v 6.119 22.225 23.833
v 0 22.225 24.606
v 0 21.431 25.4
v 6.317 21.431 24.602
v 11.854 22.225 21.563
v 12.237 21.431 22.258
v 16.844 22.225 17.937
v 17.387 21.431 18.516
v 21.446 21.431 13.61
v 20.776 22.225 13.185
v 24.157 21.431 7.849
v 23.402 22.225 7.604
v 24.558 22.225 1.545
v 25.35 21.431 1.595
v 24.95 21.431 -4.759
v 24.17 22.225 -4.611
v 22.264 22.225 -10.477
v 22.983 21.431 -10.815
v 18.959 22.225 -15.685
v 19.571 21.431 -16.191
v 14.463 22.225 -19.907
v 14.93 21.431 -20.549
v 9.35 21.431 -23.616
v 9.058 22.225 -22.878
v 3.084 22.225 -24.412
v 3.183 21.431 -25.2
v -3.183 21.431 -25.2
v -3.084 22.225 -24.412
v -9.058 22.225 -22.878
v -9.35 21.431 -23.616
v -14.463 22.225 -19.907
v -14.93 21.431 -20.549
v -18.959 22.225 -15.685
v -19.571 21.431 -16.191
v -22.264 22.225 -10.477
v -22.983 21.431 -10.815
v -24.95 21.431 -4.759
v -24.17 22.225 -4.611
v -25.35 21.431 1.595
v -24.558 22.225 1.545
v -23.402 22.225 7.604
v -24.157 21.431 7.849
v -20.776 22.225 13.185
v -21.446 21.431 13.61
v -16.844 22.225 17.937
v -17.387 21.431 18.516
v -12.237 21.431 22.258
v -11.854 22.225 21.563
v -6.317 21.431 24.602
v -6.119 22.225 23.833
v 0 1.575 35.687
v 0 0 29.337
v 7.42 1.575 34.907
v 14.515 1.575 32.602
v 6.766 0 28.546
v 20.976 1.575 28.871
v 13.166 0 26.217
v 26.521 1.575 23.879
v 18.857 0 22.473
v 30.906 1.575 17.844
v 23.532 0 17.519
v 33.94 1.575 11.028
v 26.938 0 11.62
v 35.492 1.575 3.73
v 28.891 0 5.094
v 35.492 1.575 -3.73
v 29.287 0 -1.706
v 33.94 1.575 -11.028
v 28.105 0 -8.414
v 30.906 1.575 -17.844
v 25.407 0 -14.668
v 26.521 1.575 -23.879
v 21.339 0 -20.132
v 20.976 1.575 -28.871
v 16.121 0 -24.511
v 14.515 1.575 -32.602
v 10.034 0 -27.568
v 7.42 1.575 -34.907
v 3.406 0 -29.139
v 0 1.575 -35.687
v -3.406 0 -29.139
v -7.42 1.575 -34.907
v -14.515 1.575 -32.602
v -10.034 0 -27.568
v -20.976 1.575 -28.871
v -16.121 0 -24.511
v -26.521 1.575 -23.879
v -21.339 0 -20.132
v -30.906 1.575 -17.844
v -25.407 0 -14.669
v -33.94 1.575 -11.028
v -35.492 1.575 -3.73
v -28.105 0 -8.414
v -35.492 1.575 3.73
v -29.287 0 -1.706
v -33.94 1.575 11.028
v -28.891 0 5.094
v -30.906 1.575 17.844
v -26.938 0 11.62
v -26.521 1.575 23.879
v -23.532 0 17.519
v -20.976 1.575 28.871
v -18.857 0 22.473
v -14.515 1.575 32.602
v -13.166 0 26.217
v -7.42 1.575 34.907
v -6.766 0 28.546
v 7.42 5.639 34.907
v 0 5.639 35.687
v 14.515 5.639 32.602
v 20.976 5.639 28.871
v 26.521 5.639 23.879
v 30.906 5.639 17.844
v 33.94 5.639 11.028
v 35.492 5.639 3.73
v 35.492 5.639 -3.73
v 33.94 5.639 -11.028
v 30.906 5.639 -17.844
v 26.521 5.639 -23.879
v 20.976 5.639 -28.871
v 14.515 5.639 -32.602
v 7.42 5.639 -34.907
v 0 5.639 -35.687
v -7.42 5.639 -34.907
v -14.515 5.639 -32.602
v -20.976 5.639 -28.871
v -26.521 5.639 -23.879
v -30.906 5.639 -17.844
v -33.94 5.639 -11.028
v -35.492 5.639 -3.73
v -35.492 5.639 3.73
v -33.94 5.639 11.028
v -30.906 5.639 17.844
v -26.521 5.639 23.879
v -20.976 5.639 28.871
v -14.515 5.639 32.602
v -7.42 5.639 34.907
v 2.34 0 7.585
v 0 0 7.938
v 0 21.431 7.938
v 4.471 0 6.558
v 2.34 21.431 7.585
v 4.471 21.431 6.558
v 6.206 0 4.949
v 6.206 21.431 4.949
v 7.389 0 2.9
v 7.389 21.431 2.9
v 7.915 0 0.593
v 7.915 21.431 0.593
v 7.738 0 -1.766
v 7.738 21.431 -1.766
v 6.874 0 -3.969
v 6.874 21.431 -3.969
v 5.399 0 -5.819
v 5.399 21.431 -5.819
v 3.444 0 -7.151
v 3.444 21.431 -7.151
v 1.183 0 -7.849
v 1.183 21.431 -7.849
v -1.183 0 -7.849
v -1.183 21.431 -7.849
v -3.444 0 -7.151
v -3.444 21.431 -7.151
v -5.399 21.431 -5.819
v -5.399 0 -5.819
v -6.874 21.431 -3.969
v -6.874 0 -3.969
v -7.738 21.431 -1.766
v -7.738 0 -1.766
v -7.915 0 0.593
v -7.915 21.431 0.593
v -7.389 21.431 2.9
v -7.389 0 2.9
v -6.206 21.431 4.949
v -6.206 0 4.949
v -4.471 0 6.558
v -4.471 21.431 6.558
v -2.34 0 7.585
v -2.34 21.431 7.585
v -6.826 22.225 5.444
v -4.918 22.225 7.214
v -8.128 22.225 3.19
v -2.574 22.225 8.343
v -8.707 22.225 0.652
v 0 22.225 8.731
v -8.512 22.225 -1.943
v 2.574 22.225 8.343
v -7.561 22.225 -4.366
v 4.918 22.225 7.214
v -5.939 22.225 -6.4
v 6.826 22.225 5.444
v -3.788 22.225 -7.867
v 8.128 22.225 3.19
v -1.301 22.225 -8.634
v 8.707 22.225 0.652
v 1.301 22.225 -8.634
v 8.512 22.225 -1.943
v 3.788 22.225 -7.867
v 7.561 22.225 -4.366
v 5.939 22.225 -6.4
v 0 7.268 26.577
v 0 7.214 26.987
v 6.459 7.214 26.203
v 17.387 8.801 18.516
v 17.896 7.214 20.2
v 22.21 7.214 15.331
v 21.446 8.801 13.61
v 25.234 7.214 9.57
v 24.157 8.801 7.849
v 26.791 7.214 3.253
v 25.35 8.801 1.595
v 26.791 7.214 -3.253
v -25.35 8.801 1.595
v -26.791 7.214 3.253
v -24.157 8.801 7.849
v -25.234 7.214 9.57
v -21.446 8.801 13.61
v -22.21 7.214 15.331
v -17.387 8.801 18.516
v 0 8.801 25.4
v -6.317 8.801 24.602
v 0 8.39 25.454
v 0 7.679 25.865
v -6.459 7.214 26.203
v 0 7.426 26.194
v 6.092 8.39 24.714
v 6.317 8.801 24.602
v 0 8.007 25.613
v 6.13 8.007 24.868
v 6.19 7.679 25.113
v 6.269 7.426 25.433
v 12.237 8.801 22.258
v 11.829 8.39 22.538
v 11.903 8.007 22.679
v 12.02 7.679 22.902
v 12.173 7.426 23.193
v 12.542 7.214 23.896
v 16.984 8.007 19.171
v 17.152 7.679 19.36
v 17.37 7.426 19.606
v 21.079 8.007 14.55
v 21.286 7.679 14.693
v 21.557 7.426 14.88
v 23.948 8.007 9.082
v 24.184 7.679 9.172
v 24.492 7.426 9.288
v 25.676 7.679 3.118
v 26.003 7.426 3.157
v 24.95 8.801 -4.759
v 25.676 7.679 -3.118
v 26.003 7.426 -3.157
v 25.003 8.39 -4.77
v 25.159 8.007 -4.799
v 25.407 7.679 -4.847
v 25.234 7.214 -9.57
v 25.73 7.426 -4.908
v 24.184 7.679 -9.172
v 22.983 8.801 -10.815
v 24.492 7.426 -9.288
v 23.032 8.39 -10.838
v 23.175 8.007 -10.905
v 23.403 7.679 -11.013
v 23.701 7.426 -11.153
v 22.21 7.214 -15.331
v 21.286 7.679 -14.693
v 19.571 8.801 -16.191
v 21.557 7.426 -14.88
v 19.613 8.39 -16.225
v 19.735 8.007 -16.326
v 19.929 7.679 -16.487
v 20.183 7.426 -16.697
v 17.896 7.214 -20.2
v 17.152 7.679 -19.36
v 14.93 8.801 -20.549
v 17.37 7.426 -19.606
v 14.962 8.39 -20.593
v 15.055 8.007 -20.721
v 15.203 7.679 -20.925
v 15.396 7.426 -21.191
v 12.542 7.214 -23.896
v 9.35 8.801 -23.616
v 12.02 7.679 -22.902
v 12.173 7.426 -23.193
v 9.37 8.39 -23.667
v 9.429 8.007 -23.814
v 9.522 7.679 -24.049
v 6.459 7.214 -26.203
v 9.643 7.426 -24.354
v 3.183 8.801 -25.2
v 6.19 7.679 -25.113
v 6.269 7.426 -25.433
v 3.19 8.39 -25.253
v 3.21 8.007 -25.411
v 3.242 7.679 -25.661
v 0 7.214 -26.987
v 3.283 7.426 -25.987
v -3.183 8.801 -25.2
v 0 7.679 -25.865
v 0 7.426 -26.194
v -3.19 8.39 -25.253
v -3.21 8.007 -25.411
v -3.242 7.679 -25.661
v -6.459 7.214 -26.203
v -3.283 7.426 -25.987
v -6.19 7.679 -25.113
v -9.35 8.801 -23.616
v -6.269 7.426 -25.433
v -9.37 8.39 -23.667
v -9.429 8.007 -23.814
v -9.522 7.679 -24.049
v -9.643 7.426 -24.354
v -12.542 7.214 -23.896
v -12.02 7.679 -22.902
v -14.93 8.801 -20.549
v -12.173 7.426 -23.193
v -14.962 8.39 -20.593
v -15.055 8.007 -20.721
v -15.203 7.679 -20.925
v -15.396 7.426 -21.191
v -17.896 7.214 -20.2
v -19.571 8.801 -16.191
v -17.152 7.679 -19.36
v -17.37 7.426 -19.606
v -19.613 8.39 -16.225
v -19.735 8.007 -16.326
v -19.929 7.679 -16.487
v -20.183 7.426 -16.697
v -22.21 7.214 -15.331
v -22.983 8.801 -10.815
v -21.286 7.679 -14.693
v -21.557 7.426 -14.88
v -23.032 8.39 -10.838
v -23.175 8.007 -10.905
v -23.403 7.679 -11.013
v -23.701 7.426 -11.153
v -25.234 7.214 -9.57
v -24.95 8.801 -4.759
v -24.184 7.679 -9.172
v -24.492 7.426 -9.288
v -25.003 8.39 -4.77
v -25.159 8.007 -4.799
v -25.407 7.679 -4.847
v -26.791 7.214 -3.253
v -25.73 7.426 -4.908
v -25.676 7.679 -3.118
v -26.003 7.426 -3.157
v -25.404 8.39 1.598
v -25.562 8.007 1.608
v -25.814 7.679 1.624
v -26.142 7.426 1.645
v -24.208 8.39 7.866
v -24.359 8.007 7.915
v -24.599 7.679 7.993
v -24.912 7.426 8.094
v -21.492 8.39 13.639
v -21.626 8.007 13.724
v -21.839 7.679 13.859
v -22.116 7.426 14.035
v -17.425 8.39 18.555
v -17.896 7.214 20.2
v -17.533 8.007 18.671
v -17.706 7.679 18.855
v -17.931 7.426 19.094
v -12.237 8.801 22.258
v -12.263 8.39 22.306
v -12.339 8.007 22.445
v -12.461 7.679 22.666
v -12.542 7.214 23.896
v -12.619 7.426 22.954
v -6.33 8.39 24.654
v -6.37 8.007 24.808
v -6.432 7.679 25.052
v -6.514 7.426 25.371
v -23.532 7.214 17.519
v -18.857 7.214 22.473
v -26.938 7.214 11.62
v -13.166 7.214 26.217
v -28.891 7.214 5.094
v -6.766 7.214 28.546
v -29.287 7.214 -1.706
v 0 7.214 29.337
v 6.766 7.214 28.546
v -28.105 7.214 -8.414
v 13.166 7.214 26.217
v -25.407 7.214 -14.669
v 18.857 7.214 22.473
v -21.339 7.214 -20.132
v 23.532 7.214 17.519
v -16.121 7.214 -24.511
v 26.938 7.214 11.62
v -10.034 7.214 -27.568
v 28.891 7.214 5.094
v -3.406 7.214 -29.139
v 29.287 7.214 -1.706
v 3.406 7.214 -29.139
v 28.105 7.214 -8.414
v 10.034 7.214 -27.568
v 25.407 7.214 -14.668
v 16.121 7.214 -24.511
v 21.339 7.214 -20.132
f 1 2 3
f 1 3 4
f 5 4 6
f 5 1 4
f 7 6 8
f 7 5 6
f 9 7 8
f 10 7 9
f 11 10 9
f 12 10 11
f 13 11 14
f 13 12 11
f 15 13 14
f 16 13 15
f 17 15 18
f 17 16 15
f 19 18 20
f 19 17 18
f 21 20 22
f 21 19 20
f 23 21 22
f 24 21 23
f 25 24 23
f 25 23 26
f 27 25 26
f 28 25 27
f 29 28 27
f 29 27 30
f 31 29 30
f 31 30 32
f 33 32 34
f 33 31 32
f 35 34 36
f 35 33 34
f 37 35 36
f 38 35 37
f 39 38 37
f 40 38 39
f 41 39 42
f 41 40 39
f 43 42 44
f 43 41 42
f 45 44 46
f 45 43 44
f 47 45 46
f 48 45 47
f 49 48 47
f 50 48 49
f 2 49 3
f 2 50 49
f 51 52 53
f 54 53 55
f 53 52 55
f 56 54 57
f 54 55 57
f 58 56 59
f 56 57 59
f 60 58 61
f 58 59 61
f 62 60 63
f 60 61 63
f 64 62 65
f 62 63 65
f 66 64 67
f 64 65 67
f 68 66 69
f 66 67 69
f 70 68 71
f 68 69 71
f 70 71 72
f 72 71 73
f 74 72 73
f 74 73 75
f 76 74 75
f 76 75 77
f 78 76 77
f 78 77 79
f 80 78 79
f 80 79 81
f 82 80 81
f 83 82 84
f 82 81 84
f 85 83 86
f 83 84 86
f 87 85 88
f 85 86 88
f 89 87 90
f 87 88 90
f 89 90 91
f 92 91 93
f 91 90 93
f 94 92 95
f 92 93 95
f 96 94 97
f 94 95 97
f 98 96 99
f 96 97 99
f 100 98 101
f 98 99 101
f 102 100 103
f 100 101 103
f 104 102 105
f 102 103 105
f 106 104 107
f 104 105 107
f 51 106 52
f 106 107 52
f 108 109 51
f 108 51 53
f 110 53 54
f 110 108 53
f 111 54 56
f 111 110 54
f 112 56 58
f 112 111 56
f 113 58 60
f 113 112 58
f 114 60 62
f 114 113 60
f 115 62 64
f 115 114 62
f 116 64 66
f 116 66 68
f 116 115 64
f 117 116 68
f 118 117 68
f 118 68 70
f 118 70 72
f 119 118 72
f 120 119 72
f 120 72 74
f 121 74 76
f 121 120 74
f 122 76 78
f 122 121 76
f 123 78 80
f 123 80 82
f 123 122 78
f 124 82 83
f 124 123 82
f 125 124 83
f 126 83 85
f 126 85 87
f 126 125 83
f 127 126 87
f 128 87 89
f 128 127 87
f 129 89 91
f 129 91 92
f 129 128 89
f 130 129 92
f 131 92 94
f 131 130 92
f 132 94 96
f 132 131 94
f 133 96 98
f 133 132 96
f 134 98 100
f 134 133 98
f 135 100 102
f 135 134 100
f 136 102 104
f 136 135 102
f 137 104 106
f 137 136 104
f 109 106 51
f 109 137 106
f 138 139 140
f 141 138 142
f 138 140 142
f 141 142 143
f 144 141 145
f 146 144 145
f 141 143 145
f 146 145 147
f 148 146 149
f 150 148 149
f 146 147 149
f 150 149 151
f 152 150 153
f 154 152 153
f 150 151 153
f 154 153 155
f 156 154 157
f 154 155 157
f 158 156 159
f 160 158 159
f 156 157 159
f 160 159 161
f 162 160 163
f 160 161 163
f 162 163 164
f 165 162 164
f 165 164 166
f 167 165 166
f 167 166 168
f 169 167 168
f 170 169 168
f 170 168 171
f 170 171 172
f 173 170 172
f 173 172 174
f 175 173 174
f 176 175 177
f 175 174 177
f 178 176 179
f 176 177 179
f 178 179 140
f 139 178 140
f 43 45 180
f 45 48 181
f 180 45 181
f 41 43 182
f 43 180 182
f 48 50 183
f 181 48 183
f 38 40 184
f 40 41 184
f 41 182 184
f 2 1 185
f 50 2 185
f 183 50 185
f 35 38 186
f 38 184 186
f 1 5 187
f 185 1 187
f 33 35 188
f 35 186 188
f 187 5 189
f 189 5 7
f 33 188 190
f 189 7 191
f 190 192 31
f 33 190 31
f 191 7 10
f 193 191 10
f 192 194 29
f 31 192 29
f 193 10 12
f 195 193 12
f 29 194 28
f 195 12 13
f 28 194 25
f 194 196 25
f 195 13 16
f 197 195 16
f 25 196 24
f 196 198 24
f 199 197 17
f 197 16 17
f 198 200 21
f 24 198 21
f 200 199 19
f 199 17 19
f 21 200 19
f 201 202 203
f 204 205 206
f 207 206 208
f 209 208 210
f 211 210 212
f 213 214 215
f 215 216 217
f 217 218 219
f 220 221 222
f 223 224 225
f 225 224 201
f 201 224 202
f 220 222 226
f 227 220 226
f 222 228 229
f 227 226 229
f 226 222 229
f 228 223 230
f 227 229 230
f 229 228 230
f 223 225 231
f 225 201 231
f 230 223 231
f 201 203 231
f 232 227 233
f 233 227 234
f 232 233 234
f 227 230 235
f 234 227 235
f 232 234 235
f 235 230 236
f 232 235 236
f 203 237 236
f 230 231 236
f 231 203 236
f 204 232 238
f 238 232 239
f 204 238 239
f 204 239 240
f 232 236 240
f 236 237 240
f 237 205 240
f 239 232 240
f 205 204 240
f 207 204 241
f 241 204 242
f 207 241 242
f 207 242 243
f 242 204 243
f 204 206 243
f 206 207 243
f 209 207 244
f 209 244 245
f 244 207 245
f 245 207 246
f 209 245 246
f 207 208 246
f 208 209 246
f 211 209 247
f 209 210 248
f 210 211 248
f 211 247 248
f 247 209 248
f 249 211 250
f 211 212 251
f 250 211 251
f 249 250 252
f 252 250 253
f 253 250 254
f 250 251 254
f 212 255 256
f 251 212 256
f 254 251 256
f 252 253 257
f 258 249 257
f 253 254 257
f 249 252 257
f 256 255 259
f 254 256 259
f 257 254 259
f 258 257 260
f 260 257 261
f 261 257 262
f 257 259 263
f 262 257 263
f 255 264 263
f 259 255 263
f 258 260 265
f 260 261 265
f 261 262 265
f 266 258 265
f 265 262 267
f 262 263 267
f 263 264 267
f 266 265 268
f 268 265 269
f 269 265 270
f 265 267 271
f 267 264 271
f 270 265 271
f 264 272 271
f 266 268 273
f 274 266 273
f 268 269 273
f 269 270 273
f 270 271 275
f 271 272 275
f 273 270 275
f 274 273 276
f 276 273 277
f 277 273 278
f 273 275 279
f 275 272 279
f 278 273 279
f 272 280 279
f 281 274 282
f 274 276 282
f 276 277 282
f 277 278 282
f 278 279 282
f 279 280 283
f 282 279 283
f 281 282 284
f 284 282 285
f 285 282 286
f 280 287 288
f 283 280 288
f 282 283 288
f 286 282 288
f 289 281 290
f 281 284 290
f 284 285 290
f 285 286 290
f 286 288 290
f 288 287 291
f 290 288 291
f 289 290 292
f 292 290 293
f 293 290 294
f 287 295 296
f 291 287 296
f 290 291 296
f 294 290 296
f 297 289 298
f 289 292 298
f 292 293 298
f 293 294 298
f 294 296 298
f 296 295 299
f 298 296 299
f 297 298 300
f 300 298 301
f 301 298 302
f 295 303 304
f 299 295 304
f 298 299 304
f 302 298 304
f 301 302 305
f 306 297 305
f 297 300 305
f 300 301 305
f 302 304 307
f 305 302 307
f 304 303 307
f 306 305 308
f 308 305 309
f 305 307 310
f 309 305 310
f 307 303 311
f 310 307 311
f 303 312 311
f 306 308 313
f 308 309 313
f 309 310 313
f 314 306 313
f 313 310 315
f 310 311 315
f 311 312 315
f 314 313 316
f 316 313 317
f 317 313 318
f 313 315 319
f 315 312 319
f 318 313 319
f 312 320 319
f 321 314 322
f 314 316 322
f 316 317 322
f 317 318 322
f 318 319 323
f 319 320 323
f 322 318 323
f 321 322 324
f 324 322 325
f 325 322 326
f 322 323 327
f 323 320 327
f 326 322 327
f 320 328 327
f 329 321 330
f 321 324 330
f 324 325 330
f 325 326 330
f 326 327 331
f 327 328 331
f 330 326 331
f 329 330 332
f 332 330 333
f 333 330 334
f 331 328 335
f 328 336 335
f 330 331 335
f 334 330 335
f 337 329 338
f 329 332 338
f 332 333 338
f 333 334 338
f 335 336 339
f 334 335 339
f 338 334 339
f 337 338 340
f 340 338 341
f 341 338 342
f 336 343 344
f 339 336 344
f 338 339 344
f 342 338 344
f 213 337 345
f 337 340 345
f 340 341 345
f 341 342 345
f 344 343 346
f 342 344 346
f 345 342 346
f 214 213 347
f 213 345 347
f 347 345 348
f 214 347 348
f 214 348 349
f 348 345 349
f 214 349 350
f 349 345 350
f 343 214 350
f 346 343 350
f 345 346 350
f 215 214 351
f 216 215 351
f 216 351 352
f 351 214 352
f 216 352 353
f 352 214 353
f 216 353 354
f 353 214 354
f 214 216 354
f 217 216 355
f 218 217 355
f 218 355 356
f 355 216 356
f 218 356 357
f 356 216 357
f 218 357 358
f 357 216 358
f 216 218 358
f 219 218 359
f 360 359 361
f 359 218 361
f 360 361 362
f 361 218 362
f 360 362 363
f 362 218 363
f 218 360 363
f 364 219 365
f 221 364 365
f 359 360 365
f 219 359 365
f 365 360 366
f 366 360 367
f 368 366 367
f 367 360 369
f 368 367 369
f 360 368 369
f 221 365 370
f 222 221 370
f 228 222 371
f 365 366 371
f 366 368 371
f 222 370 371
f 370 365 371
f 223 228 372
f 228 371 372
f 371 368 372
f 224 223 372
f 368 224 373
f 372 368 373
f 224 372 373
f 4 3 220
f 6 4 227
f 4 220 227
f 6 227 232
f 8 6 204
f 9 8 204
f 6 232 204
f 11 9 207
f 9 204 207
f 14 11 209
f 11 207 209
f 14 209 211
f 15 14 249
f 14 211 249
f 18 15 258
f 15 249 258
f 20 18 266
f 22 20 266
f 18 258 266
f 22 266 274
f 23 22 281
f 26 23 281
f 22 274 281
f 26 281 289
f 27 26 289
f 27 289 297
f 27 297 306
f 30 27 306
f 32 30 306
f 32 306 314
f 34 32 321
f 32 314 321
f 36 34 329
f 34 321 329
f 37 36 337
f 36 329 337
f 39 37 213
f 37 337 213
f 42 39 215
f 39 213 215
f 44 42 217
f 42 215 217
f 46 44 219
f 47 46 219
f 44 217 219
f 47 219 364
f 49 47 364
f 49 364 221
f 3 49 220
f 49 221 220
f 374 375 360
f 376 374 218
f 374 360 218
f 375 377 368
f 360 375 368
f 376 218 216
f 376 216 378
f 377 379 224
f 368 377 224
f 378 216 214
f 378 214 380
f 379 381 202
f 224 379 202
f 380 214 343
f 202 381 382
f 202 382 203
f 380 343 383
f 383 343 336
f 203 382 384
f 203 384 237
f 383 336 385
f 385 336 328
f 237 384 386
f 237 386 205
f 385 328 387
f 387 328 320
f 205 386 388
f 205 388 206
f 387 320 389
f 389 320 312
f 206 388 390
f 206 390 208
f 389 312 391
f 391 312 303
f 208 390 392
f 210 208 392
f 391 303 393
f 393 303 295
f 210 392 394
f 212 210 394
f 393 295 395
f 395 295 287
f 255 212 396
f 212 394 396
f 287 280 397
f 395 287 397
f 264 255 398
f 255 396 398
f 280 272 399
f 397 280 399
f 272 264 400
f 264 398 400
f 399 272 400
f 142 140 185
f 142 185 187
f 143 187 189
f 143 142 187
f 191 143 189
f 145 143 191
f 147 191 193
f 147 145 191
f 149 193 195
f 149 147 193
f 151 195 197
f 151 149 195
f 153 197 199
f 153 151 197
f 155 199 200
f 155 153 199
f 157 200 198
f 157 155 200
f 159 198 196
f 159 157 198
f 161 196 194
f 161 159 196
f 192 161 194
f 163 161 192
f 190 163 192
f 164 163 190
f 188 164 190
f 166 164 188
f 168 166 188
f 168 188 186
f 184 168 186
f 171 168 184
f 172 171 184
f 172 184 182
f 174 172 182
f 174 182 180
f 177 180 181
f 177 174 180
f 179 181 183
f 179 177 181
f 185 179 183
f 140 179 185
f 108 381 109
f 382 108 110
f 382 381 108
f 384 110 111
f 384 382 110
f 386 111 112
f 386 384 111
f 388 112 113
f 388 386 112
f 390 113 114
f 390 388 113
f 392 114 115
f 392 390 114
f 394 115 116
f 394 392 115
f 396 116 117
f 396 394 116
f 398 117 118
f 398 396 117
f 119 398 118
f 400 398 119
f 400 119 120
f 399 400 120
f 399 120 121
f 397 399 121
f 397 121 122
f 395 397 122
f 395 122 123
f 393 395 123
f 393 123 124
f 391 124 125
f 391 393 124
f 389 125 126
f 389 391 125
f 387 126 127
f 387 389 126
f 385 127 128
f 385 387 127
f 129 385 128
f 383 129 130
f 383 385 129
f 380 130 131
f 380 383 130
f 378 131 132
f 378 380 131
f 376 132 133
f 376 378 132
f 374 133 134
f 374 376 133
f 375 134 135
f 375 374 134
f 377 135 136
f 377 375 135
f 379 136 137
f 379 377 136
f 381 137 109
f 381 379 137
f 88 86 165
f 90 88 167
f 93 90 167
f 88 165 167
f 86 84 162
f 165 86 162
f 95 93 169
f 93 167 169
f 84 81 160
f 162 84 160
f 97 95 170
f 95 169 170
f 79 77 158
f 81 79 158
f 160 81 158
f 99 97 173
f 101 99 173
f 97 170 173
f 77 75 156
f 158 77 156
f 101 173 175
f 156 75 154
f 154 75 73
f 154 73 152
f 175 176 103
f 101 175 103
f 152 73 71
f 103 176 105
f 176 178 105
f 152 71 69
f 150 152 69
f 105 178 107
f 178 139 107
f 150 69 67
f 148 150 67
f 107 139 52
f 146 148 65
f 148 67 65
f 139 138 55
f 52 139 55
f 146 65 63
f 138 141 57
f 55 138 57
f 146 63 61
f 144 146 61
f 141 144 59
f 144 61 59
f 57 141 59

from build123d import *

# Parameters (mm, degrees)
F0_W     = 15.0114
F0_H     = 17.4625
F0_W_2   = 7.2136
F0_H_2   = 10.287
F2_R     = 1.5875
F3_SIZE  = 0.79375
F4_SIZE2 = 6.35
F4_SIZE  = 1.5748


with BuildPart() as f1:
    # F0 (on Right) → F1 (revolve)
    with BuildSketch(Plane.YZ):
        with Locations((14.7193, 16.66875)):
            Rectangle(F0_W, F0_H)
        with Locations((3.6068, 16.66875)):
            Rectangle(F0_W_2, F0_H)
        with Locations((3.6068, 30.5435)):
            Rectangle(F0_W_2, F0_H_2)
    revolve(axis=Axis((0, 9.448286066, 0), (0, 1, 0)))

    # F2
    f2_edges = [f1.edges().sort_by_distance(p)[0] for p in [
        (0, 7.2136, -25.4),
    ]]
    fillet(f2_edges, radius=F2_R)

    # F3
    f3_edges = [f1.edges().sort_by_distance(p)[0] for p in [
        (0, 22.225, -7.9375),
        (0, 22.225, -25.4),
    ]]
    chamfer(f3_edges, length=F3_SIZE)

    # F4
    f4_edges = [f1.edges().sort_by_distance(p)[0] for p in [
        (0, 0, -35.687),
        (0, 7.2136, -35.687),
    ]]
    f4_side = f1.faces().sort_by_distance((0, 3.6068, -35.687))[0]
    chamfer(f4_edges, length=F4_SIZE, length2=F4_SIZE2, reference=f4_side)


solid = f1.part
